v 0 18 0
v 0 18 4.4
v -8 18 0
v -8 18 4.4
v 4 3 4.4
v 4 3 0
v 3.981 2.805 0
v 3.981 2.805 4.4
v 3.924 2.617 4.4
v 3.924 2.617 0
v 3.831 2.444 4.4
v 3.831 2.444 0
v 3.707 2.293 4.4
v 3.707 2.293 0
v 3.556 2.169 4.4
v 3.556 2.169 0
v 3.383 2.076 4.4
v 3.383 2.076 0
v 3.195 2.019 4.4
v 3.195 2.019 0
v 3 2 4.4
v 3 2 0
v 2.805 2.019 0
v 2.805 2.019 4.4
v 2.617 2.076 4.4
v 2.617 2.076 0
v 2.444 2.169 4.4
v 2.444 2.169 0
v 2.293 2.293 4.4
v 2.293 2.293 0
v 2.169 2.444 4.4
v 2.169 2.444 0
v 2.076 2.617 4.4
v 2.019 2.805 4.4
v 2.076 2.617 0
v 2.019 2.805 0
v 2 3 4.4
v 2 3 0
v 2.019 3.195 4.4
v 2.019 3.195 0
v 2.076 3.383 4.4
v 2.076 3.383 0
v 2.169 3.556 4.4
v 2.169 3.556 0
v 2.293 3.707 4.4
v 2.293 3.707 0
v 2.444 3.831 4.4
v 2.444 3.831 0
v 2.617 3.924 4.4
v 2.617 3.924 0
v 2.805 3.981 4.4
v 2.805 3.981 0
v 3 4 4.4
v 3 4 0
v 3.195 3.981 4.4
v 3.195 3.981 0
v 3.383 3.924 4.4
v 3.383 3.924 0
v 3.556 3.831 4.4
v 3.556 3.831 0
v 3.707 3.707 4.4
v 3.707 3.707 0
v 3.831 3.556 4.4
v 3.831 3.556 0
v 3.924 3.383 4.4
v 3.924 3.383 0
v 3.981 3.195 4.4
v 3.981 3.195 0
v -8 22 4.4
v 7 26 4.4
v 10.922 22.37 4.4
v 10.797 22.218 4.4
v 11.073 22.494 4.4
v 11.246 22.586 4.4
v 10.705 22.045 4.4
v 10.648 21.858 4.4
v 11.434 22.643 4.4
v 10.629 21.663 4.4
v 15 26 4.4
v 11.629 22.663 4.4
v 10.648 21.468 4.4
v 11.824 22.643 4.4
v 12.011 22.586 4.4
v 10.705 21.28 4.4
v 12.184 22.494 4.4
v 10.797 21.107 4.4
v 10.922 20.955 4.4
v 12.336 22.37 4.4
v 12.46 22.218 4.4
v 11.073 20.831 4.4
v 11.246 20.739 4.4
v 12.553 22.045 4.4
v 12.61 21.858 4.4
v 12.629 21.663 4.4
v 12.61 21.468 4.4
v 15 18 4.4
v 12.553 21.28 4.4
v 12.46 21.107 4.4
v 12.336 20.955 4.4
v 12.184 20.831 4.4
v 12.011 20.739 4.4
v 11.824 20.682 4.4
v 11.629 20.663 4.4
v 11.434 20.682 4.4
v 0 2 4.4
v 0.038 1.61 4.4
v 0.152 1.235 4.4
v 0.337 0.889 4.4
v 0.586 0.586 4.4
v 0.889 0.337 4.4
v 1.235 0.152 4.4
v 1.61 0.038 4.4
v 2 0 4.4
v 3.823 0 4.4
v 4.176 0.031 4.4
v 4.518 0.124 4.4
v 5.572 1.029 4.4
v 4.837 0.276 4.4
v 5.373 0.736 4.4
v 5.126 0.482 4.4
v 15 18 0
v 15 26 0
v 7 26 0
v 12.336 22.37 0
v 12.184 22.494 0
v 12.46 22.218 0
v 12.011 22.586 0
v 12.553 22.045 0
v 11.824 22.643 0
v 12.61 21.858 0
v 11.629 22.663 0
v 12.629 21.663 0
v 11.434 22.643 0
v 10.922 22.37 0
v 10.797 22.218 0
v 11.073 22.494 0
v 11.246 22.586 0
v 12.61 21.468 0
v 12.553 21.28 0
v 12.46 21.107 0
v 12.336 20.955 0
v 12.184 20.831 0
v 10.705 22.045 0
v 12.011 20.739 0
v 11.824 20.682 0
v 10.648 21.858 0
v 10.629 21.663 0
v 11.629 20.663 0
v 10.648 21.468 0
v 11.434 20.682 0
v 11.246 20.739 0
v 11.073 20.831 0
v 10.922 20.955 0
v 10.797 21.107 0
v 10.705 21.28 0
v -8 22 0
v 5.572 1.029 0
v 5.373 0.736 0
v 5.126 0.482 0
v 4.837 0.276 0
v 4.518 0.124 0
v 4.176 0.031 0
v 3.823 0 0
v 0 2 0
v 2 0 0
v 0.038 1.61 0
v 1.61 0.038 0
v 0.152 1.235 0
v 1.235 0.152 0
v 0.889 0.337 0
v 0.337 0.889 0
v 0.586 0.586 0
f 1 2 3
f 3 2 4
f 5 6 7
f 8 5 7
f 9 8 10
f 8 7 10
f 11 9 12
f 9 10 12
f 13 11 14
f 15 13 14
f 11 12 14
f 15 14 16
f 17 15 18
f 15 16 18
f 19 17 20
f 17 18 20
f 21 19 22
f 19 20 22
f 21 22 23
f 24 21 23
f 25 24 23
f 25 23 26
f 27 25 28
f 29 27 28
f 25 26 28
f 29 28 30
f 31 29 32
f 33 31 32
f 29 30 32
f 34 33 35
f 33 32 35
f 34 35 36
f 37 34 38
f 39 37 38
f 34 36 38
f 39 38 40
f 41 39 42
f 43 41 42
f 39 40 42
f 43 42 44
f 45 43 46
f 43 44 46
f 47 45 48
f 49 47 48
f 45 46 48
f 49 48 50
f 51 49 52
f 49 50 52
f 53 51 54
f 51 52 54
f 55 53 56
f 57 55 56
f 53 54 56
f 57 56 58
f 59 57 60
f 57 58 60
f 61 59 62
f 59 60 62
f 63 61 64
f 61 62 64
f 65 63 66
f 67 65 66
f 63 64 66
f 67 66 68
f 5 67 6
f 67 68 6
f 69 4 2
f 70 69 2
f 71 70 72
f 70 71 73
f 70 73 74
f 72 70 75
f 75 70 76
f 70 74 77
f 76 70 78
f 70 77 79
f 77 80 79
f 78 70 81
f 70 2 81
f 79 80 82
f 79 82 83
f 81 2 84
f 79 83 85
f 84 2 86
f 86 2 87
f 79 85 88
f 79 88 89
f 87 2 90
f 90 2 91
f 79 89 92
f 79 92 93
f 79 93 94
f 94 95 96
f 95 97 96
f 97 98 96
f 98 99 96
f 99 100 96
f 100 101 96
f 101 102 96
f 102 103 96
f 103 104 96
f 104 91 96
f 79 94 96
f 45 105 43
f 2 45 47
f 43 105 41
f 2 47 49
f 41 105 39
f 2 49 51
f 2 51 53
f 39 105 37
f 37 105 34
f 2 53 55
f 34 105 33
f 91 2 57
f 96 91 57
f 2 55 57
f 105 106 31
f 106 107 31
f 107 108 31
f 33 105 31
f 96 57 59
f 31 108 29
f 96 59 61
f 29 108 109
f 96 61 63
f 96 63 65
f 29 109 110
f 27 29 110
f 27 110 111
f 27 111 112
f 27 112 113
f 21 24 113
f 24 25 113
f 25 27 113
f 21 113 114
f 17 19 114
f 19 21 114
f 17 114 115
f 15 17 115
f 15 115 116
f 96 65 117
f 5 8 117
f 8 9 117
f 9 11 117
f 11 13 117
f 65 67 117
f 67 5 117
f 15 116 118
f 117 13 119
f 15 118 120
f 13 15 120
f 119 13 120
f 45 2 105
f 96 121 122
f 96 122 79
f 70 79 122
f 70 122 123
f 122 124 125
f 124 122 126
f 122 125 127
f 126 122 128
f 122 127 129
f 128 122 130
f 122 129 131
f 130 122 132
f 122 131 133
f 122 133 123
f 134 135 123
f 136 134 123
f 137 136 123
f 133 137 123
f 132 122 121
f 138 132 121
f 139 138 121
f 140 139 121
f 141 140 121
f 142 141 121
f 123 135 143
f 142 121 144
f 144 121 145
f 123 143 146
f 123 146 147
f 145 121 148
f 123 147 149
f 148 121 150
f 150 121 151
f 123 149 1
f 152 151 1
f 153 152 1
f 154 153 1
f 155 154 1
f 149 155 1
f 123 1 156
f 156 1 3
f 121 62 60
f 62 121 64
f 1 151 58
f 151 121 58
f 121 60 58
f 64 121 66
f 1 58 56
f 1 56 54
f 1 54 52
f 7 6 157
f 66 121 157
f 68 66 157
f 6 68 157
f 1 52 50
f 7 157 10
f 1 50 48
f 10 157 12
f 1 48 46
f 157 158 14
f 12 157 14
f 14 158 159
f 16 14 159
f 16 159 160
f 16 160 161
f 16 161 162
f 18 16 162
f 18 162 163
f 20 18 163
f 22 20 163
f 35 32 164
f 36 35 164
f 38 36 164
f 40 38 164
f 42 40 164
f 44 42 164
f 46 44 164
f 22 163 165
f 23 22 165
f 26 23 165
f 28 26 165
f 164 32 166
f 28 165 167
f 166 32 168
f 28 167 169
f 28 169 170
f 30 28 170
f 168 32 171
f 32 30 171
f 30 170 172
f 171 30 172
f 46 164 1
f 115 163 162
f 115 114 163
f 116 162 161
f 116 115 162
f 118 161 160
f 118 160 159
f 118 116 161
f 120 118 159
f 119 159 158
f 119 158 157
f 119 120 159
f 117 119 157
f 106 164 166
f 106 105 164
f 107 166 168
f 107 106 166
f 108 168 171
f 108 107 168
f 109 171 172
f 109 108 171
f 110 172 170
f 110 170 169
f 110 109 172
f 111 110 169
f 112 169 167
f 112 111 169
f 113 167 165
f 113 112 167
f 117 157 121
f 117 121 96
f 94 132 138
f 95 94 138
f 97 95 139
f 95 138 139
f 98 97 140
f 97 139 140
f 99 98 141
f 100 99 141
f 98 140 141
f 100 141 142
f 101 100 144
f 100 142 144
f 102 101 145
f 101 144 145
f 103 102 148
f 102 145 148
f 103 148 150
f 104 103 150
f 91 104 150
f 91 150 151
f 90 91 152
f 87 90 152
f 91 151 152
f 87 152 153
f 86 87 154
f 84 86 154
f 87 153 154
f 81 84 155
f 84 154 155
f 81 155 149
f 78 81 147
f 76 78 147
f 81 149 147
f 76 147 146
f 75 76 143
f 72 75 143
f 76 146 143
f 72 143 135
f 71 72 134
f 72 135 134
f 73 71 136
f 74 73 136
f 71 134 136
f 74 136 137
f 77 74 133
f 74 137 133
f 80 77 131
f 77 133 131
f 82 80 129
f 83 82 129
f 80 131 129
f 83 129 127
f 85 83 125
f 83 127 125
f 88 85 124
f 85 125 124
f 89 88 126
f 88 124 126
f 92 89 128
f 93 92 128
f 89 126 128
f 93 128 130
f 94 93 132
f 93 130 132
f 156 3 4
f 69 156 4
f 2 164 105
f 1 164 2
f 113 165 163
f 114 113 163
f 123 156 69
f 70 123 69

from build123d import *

# Parameters (mm, degrees)
F0_W      = 15
F0_H      = 18
F1_DEPTH  = 4.4
F2_R      = 2
F3_SIZE2  = 9.99999
F3_SIZE   = 17.99999
F4_R      = 2
F6_W      = 8
F6_H      = 4.4
F6_W_2    = 15
F7_DEPTH  = 4
F8_DEPTH  = 4
F9_SIZE2  = 15
F9_SIZE   = 4
F10_DEPTH = 4.4
F11_R     = 1
F12_DEPTH = 4.4


# Not quite as in the source:
# - a fillet or chamfer is up to 0.001 mm smaller than in the source, because OpenCascade refuses the exact size


with BuildPart() as f1:
    # F0 (on Top) → F1 (new body)
    with BuildSketch(Plane.XY):
        with Locations((7.5, 9)):
            Rectangle(F0_W, F0_H)
    extrude(amount=F1_DEPTH)

    # F2
    f2_edges = [f1.edges().sort_by_distance(p)[0] for p in [
        (0, 0, 2.2),
    ]]
    fillet(f2_edges, radius=F2_R)

    # F3 (size 18 and 10 in the source; OpenCascade refuses exactly that, so slightly less here)
    f3_edges = [f1.edges().sort_by_distance(p)[0] for p in [
        (15, 0, 2.2),
    ]]
    f3_side = f1.faces().sort_by_distance((15, 9, 2.2))[0]
    chamfer(f3_edges, length=F3_SIZE, length2=F3_SIZE2, reference=f3_side)

    # F4
    f4_edges = [f1.edges().sort_by_distance(p)[0] for p in [
        (5.00001, 0, 2.2),
    ]]
    fillet(f4_edges, radius=F4_R)

    # F6 (on face) → F7 (join)
    with BuildSketch(Plane(origin=(0, 18, 0), x_dir=(-1, 0, 0), z_dir=(0, 1, 0))):
        with Locations((4, 2.2)):
            Rectangle(F6_W, F6_H)
        with Locations((-7.5, 2.2)):
            Rectangle(F6_W_2, F6_H)
    extrude(amount=F7_DEPTH)

    # F8 (add): a face of the model
    f8_faces = [f1.faces().sort_by_distance(p)[0] for p in [
        (3.5, 22, 2.2),
    ]]
    extrude(f8_faces, amount=F8_DEPTH)

    # F9
    f9_edges = [f1.edges().sort_by_distance(p)[0] for p in [
        (-8, 26, 2.2),
    ]]
    f9_side = f1.faces().sort_by_distance((-8, 22, 2.2))[0]
    chamfer(f9_edges, length=F9_SIZE, length2=F9_SIZE2, reference=f9_side)

    # F5 (on face) → F10 (cut)
    with BuildSketch(Plane(origin=(0, 0, 0), x_dir=(1, 0, 0), z_dir=(0, 0, -1))):
        with BuildLine():
            ThreePointArc((2, -3), (3, -4), (4, -3))
            ThreePointArc((4, -3), (3, -2), (2, -3))
        make_face()
    extrude(amount=-F10_DEPTH, mode=Mode.SUBTRACT)

    # F11 (on face) → F12 (cut)
    with BuildSketch(Plane(origin=(0, 0, 0), x_dir=(1, 0, 0), z_dir=(0, 0, -1))):
        with Locations((11.6287460551, -21.6625984758)):
            Circle(F11_R)
    extrude(amount=-F12_DEPTH, mode=Mode.SUBTRACT)


solid = f1.part
